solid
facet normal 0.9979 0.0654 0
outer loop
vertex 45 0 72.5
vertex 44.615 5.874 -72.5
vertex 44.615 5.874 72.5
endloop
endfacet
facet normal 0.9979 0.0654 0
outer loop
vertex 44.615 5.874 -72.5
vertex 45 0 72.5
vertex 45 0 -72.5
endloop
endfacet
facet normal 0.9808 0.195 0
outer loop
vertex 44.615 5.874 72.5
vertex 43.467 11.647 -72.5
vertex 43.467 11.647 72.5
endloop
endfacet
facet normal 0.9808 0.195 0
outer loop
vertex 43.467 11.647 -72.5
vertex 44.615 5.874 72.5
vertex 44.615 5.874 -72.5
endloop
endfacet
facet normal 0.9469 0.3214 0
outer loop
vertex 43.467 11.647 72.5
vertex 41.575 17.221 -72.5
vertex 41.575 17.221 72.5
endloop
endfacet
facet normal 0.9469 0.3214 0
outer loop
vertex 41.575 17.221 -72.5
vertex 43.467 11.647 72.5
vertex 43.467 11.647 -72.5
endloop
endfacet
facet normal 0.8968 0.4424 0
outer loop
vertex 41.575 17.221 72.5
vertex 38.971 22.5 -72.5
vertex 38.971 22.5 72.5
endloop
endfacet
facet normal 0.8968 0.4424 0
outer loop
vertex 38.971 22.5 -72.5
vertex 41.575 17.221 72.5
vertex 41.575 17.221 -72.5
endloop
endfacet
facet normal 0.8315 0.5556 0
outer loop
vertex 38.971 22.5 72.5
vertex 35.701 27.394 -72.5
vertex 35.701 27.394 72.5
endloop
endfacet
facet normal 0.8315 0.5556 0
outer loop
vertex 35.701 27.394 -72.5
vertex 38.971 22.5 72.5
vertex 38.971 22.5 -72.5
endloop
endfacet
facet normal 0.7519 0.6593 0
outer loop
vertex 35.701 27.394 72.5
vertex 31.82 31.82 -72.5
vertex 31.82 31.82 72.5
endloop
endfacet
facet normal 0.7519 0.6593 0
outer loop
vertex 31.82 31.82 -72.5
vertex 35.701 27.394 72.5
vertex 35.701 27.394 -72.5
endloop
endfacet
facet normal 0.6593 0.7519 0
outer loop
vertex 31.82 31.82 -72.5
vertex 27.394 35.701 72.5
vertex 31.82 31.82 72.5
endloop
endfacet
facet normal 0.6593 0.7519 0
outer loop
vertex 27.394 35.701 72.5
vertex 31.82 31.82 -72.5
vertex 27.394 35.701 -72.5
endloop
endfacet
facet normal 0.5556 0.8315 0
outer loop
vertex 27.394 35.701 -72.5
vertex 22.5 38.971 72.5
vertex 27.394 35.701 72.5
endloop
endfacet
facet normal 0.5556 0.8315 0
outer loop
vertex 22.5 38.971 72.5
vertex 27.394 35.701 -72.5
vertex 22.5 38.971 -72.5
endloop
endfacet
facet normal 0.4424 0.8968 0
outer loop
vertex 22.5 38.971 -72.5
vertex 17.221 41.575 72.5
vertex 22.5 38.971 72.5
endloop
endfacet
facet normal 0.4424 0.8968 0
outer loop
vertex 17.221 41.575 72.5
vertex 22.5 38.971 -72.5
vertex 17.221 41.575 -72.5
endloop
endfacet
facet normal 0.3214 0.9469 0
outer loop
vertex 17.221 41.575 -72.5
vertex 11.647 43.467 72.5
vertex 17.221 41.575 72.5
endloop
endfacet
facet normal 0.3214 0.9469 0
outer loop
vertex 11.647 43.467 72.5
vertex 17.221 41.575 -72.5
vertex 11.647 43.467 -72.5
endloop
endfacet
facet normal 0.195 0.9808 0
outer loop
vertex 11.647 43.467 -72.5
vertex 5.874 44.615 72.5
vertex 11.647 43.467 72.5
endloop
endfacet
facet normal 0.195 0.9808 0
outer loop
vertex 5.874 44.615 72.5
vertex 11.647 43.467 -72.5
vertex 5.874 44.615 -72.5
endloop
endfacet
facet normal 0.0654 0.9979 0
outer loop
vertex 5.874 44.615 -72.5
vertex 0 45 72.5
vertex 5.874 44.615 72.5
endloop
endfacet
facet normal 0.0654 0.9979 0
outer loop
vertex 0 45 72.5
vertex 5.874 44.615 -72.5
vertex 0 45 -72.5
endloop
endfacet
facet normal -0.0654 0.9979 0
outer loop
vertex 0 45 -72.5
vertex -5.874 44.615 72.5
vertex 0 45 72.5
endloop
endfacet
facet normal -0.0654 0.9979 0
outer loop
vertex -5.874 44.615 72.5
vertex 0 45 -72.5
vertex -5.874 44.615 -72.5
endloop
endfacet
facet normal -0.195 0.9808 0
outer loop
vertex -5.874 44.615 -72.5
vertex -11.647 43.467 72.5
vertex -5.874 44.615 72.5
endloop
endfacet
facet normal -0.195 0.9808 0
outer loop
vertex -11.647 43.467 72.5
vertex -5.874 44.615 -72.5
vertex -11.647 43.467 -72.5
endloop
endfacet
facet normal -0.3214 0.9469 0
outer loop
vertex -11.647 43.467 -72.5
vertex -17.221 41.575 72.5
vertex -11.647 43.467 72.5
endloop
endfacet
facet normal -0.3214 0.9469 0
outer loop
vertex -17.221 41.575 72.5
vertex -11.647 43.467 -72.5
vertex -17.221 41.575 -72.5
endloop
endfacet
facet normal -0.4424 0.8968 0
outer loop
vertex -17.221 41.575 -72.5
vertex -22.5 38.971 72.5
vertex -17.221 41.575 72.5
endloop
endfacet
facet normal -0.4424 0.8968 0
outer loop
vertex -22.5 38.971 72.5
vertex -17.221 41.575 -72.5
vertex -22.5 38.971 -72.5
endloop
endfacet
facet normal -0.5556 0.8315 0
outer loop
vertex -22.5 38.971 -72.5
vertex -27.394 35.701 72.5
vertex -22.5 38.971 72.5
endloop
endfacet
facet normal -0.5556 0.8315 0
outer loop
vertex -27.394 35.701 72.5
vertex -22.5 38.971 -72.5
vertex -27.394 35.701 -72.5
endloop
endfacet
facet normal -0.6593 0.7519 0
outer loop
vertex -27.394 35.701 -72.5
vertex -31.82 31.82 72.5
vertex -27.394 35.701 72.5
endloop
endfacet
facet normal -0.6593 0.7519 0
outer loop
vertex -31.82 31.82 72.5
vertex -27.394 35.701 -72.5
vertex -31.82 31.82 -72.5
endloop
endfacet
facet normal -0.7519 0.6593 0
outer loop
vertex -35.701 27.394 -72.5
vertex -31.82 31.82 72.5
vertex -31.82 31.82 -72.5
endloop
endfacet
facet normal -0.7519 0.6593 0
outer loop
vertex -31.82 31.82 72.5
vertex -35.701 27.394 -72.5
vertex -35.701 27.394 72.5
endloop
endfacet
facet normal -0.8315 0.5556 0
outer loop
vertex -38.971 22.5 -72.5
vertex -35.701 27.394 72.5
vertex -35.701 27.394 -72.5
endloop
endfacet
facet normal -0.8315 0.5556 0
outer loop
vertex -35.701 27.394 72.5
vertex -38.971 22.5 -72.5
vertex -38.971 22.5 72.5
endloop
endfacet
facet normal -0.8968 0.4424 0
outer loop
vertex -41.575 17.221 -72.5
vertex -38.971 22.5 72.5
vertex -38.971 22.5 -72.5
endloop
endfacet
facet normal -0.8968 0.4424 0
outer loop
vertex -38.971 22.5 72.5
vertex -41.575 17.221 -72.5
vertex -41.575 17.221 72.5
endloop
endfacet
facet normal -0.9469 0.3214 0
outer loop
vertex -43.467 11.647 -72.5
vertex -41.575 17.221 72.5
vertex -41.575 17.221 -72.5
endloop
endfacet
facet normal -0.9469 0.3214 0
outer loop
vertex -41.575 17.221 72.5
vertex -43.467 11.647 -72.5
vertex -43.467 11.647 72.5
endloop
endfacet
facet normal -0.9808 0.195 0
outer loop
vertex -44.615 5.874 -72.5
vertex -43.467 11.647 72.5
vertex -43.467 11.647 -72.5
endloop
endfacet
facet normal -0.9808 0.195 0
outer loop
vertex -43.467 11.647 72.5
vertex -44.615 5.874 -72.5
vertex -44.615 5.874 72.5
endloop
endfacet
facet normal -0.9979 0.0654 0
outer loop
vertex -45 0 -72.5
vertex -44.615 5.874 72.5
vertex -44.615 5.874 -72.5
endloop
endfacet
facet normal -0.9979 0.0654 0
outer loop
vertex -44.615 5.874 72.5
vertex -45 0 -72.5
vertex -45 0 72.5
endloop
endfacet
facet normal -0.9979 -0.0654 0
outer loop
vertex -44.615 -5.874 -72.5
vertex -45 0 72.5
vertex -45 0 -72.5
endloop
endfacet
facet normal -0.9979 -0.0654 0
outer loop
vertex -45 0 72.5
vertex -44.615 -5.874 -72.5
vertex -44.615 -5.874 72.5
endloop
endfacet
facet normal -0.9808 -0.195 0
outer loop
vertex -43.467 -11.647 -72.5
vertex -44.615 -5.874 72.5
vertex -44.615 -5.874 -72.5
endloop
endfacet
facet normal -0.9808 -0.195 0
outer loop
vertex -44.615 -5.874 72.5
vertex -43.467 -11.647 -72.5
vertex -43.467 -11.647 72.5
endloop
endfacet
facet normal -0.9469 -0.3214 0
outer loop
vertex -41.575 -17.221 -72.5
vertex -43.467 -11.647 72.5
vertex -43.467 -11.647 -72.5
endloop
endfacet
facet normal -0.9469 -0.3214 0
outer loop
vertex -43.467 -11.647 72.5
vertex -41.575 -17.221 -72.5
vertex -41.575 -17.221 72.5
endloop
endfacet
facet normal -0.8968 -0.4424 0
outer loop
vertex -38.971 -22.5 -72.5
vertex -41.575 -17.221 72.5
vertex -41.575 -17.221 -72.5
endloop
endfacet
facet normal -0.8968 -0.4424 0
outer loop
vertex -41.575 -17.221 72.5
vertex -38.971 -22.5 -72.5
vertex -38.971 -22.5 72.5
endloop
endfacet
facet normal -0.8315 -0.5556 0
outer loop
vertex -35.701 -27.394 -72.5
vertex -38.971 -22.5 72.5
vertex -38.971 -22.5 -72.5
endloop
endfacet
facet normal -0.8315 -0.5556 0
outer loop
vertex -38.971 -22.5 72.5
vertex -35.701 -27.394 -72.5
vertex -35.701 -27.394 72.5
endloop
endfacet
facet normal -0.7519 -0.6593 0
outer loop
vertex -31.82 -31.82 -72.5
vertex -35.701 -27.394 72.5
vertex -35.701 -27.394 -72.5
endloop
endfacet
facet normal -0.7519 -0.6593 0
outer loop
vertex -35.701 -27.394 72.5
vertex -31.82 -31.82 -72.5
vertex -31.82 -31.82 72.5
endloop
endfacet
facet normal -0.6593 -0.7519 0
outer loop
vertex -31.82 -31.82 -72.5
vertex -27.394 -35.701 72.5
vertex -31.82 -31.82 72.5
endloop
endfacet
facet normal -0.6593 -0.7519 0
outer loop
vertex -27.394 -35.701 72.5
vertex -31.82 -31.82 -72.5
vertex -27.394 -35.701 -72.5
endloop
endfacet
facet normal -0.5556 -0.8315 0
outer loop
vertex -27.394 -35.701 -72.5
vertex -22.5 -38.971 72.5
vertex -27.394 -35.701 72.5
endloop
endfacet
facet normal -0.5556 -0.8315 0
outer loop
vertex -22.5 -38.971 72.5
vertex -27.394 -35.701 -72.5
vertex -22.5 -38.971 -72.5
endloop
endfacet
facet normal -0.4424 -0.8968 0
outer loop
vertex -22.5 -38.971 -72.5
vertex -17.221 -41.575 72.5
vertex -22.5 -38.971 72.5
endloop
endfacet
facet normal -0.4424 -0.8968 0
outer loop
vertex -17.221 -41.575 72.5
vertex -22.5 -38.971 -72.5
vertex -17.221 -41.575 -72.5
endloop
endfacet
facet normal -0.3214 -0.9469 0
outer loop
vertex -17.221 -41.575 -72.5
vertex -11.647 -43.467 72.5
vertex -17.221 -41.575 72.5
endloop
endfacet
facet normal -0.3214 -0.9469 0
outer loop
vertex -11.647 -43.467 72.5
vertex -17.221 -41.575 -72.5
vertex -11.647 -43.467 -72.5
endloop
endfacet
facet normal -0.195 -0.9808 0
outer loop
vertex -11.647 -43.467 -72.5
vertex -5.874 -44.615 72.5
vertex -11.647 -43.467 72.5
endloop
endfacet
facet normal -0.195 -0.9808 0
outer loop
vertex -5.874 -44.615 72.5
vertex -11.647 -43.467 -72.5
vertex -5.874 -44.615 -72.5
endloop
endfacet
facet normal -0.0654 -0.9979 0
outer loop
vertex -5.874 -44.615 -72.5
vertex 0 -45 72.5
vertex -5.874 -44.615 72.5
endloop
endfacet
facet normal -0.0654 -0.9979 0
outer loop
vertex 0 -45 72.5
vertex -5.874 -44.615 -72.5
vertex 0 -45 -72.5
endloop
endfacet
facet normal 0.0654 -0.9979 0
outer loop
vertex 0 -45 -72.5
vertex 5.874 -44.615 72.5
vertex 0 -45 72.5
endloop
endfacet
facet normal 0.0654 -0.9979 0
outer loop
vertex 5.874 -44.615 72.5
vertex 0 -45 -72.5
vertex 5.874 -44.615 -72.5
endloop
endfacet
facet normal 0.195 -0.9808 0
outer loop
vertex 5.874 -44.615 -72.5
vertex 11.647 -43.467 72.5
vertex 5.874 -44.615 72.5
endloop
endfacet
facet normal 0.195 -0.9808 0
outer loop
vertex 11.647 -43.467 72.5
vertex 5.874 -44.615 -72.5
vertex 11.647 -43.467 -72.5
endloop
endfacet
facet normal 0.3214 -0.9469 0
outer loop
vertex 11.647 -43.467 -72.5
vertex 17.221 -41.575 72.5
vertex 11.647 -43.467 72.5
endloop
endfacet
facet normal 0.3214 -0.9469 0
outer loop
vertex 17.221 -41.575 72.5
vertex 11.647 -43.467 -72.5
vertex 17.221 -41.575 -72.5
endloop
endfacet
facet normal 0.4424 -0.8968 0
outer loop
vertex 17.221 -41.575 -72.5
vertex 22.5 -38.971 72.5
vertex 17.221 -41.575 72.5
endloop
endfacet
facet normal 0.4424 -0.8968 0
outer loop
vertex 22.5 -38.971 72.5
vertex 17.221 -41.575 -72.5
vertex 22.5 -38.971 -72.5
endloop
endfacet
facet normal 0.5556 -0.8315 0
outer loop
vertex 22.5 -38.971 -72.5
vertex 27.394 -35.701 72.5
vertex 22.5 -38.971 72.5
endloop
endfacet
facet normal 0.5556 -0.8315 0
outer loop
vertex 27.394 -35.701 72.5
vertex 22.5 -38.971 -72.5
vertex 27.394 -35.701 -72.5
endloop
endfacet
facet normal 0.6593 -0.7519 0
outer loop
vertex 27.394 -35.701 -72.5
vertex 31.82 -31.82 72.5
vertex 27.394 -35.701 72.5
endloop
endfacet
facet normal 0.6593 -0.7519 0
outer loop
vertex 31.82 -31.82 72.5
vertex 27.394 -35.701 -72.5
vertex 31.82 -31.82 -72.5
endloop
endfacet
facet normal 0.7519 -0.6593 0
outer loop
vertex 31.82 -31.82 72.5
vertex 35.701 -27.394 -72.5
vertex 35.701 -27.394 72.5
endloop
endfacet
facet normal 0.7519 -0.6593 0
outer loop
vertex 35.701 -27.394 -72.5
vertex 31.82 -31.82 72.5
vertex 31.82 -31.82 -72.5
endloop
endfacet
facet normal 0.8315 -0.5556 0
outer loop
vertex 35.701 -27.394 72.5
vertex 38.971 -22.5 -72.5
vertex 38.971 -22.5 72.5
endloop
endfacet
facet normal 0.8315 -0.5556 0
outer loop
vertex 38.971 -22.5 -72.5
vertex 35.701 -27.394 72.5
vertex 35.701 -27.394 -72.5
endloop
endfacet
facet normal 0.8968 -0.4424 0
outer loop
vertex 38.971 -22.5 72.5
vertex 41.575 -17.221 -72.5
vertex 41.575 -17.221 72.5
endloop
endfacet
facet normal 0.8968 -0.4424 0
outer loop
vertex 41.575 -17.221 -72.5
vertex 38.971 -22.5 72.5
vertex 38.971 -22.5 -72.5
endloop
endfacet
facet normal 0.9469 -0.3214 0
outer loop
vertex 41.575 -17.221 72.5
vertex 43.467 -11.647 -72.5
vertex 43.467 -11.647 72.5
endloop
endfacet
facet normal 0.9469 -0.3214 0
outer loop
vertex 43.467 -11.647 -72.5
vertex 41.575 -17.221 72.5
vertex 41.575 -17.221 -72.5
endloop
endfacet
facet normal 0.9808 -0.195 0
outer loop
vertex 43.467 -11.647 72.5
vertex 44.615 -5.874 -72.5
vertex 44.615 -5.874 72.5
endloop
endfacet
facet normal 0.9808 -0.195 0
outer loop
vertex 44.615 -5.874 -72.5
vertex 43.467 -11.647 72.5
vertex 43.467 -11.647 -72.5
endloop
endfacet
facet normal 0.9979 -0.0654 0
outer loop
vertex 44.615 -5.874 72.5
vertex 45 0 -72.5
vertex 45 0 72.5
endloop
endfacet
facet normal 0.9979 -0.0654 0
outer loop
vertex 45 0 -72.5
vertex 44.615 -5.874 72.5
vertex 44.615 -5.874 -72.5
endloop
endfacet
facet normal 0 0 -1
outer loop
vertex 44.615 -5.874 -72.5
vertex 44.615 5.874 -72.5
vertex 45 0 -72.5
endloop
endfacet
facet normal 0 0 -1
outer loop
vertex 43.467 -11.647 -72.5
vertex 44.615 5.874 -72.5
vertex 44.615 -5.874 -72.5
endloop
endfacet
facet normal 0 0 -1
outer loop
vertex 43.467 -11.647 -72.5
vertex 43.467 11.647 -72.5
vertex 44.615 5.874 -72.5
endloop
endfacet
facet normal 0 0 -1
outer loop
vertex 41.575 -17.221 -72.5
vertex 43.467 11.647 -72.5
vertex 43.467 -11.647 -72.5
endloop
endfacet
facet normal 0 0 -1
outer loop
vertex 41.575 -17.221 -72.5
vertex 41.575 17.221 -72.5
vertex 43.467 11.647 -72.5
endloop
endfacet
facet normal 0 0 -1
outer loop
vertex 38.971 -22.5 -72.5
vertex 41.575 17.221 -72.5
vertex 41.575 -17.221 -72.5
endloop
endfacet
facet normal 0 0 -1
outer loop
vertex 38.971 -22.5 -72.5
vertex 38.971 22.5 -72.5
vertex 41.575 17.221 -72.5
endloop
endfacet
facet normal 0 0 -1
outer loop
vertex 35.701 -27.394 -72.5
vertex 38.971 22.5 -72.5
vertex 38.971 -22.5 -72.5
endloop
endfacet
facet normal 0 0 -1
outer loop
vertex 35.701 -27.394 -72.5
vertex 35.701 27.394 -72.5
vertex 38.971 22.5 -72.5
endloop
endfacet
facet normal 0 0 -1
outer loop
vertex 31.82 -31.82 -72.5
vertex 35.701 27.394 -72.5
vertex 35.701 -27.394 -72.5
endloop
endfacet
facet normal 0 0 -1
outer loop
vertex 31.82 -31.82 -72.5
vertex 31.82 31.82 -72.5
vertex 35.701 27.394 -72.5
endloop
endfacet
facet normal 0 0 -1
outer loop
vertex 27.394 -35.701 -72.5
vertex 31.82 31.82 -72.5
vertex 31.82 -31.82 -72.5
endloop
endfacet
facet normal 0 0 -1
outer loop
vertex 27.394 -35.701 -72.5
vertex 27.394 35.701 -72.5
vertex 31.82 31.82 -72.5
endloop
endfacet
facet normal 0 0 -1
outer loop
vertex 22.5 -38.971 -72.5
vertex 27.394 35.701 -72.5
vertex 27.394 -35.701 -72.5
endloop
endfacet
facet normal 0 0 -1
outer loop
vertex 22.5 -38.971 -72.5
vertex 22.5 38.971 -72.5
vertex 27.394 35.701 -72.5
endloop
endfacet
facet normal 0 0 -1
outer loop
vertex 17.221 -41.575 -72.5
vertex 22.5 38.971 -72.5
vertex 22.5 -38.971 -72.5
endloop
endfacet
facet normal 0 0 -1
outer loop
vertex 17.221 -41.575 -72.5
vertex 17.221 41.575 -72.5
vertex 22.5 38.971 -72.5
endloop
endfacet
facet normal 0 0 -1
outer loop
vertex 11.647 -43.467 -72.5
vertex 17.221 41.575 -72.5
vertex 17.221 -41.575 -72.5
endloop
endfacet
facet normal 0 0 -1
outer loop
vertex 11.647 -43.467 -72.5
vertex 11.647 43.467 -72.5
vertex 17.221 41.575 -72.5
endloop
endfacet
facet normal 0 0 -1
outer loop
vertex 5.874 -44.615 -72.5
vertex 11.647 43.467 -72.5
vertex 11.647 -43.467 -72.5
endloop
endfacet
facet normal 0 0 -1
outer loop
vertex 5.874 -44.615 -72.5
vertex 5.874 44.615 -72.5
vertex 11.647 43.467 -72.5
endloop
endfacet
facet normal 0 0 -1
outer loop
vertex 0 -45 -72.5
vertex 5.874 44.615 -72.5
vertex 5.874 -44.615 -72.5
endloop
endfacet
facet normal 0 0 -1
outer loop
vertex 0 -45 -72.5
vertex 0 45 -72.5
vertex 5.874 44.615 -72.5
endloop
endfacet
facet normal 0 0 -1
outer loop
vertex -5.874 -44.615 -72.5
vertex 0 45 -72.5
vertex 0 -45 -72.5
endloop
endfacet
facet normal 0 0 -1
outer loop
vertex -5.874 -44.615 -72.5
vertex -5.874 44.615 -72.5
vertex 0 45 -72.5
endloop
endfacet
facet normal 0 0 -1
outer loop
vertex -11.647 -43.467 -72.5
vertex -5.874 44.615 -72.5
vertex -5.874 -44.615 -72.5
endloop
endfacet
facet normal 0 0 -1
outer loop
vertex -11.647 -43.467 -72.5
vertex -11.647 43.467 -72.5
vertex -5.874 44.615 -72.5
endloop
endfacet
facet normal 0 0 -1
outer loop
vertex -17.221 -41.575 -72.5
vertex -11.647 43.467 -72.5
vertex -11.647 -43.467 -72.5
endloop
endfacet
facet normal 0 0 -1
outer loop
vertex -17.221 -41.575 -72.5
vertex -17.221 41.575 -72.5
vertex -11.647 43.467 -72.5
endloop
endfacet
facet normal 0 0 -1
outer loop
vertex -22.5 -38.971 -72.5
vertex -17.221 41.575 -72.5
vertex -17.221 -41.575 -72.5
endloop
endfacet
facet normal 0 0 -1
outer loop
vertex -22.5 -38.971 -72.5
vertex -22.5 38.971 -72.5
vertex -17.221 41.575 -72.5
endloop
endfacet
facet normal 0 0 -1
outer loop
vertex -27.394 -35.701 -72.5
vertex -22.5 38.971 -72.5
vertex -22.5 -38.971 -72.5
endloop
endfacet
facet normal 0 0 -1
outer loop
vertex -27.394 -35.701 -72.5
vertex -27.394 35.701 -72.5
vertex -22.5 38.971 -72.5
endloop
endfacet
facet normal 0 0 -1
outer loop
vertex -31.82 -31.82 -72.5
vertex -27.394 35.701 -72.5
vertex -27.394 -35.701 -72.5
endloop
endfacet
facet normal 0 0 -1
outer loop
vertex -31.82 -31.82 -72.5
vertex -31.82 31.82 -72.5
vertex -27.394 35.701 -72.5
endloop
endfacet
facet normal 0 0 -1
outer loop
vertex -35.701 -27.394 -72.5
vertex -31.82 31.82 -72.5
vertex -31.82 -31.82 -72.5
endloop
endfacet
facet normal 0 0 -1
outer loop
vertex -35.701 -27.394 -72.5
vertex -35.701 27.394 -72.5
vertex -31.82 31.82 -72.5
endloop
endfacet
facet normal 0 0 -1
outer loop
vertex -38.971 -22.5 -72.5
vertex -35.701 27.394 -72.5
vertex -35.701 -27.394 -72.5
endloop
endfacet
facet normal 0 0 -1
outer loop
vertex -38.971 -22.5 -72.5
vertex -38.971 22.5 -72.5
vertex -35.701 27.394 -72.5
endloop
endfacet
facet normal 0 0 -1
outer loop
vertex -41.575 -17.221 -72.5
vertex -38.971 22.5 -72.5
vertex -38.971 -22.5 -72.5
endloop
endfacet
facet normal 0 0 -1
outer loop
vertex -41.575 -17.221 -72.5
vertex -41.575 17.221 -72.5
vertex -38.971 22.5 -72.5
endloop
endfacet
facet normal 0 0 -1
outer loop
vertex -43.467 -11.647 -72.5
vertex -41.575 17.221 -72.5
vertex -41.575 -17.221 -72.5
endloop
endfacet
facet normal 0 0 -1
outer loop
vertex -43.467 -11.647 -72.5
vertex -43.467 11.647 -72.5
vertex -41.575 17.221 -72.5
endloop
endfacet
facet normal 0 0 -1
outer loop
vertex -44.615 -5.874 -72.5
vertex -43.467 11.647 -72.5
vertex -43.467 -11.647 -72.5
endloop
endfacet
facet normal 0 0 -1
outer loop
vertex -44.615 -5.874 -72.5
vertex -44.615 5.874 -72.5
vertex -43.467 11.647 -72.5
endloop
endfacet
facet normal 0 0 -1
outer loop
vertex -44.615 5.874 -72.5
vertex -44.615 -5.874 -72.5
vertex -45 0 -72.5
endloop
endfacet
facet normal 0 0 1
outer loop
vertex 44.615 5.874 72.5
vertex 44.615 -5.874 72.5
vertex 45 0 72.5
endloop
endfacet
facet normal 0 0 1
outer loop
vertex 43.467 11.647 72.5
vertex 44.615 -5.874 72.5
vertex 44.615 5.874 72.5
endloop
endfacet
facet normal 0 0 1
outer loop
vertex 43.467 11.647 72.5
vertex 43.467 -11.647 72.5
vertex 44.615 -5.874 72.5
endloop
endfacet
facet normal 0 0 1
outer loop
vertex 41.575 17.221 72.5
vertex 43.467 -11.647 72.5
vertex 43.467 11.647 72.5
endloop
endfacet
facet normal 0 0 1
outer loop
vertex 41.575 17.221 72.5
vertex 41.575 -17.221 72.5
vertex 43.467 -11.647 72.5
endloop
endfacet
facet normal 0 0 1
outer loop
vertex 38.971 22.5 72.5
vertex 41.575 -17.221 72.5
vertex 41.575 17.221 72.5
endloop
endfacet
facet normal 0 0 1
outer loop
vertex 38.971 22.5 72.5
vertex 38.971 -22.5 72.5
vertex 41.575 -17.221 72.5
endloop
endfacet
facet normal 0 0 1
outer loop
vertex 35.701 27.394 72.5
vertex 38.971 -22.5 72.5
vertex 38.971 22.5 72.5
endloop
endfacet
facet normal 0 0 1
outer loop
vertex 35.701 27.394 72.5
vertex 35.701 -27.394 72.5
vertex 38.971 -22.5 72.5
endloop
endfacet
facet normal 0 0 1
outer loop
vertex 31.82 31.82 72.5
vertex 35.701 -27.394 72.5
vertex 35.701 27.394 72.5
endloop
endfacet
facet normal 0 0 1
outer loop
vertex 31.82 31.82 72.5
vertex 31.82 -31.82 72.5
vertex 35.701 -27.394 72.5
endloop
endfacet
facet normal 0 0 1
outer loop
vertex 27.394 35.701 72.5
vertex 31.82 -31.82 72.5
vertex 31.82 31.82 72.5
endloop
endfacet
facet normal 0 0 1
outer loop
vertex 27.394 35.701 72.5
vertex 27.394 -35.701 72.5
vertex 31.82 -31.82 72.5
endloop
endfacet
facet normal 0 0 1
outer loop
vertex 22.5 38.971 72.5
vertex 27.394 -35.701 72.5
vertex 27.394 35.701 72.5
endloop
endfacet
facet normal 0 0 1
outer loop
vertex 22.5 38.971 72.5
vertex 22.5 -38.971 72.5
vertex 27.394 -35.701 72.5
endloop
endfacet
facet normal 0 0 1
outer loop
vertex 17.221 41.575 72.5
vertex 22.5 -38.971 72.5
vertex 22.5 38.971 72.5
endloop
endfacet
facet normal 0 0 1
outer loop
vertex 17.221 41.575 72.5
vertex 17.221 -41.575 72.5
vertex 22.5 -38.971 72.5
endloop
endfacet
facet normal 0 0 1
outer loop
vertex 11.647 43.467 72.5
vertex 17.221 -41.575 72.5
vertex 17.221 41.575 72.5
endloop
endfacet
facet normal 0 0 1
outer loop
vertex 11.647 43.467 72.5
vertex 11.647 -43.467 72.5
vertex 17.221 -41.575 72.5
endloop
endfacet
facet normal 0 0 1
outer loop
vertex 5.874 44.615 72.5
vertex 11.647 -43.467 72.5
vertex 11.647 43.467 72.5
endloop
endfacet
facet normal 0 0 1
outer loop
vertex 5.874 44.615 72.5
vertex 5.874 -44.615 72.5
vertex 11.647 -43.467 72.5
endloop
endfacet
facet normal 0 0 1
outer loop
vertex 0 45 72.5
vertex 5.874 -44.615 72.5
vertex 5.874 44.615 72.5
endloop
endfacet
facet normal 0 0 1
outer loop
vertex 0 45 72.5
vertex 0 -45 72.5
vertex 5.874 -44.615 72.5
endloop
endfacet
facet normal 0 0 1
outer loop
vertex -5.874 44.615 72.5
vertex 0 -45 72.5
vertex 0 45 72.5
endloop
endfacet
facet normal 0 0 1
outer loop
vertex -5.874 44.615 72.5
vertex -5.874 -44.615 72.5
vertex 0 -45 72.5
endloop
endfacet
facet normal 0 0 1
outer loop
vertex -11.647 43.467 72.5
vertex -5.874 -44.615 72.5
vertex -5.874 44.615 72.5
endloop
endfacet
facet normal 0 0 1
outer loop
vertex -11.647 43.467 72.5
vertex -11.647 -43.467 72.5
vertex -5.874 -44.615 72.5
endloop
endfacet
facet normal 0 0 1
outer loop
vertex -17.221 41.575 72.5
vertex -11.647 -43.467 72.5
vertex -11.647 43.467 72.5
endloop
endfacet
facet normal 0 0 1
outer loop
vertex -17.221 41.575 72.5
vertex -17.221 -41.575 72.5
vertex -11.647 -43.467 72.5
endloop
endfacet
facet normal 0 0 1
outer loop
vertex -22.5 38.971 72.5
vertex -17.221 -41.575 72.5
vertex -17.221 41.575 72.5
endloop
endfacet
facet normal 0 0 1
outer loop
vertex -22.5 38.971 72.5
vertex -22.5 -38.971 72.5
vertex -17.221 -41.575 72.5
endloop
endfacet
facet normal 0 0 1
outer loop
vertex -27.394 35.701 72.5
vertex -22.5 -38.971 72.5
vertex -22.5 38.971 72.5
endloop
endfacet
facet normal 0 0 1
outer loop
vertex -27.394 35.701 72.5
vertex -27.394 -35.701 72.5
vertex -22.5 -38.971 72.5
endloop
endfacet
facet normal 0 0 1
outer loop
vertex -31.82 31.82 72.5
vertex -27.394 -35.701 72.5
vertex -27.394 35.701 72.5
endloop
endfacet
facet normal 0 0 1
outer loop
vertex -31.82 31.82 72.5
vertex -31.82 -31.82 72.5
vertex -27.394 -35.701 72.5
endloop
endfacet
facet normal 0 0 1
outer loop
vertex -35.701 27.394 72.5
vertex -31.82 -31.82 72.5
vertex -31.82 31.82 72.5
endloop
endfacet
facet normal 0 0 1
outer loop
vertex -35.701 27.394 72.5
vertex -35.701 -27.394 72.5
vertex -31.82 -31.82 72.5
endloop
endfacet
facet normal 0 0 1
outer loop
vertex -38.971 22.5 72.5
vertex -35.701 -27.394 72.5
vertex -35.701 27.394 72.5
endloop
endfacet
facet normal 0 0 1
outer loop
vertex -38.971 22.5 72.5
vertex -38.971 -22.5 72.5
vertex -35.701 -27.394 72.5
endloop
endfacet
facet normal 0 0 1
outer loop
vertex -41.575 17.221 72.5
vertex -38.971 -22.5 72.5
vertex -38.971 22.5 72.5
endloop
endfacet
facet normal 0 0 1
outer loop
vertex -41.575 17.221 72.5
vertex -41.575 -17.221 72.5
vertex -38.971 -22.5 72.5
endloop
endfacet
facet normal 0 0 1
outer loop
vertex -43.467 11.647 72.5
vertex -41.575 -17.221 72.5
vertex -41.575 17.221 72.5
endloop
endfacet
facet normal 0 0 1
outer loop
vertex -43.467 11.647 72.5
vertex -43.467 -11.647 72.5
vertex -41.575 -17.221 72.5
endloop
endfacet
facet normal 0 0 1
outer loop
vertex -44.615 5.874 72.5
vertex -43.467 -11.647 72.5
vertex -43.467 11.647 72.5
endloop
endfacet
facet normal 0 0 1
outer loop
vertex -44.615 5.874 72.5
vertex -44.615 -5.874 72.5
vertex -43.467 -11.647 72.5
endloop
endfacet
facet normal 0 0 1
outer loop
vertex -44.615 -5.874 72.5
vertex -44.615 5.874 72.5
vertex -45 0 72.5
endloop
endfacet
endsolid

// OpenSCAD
// ========================================
// a cylinder with radius 45 mm and height 145 mm
// NeuroCAD canonical IR; dimensions are millimetres
// ========================================
$fn = 48;

cylinder(r=45, h=145, center=true);
